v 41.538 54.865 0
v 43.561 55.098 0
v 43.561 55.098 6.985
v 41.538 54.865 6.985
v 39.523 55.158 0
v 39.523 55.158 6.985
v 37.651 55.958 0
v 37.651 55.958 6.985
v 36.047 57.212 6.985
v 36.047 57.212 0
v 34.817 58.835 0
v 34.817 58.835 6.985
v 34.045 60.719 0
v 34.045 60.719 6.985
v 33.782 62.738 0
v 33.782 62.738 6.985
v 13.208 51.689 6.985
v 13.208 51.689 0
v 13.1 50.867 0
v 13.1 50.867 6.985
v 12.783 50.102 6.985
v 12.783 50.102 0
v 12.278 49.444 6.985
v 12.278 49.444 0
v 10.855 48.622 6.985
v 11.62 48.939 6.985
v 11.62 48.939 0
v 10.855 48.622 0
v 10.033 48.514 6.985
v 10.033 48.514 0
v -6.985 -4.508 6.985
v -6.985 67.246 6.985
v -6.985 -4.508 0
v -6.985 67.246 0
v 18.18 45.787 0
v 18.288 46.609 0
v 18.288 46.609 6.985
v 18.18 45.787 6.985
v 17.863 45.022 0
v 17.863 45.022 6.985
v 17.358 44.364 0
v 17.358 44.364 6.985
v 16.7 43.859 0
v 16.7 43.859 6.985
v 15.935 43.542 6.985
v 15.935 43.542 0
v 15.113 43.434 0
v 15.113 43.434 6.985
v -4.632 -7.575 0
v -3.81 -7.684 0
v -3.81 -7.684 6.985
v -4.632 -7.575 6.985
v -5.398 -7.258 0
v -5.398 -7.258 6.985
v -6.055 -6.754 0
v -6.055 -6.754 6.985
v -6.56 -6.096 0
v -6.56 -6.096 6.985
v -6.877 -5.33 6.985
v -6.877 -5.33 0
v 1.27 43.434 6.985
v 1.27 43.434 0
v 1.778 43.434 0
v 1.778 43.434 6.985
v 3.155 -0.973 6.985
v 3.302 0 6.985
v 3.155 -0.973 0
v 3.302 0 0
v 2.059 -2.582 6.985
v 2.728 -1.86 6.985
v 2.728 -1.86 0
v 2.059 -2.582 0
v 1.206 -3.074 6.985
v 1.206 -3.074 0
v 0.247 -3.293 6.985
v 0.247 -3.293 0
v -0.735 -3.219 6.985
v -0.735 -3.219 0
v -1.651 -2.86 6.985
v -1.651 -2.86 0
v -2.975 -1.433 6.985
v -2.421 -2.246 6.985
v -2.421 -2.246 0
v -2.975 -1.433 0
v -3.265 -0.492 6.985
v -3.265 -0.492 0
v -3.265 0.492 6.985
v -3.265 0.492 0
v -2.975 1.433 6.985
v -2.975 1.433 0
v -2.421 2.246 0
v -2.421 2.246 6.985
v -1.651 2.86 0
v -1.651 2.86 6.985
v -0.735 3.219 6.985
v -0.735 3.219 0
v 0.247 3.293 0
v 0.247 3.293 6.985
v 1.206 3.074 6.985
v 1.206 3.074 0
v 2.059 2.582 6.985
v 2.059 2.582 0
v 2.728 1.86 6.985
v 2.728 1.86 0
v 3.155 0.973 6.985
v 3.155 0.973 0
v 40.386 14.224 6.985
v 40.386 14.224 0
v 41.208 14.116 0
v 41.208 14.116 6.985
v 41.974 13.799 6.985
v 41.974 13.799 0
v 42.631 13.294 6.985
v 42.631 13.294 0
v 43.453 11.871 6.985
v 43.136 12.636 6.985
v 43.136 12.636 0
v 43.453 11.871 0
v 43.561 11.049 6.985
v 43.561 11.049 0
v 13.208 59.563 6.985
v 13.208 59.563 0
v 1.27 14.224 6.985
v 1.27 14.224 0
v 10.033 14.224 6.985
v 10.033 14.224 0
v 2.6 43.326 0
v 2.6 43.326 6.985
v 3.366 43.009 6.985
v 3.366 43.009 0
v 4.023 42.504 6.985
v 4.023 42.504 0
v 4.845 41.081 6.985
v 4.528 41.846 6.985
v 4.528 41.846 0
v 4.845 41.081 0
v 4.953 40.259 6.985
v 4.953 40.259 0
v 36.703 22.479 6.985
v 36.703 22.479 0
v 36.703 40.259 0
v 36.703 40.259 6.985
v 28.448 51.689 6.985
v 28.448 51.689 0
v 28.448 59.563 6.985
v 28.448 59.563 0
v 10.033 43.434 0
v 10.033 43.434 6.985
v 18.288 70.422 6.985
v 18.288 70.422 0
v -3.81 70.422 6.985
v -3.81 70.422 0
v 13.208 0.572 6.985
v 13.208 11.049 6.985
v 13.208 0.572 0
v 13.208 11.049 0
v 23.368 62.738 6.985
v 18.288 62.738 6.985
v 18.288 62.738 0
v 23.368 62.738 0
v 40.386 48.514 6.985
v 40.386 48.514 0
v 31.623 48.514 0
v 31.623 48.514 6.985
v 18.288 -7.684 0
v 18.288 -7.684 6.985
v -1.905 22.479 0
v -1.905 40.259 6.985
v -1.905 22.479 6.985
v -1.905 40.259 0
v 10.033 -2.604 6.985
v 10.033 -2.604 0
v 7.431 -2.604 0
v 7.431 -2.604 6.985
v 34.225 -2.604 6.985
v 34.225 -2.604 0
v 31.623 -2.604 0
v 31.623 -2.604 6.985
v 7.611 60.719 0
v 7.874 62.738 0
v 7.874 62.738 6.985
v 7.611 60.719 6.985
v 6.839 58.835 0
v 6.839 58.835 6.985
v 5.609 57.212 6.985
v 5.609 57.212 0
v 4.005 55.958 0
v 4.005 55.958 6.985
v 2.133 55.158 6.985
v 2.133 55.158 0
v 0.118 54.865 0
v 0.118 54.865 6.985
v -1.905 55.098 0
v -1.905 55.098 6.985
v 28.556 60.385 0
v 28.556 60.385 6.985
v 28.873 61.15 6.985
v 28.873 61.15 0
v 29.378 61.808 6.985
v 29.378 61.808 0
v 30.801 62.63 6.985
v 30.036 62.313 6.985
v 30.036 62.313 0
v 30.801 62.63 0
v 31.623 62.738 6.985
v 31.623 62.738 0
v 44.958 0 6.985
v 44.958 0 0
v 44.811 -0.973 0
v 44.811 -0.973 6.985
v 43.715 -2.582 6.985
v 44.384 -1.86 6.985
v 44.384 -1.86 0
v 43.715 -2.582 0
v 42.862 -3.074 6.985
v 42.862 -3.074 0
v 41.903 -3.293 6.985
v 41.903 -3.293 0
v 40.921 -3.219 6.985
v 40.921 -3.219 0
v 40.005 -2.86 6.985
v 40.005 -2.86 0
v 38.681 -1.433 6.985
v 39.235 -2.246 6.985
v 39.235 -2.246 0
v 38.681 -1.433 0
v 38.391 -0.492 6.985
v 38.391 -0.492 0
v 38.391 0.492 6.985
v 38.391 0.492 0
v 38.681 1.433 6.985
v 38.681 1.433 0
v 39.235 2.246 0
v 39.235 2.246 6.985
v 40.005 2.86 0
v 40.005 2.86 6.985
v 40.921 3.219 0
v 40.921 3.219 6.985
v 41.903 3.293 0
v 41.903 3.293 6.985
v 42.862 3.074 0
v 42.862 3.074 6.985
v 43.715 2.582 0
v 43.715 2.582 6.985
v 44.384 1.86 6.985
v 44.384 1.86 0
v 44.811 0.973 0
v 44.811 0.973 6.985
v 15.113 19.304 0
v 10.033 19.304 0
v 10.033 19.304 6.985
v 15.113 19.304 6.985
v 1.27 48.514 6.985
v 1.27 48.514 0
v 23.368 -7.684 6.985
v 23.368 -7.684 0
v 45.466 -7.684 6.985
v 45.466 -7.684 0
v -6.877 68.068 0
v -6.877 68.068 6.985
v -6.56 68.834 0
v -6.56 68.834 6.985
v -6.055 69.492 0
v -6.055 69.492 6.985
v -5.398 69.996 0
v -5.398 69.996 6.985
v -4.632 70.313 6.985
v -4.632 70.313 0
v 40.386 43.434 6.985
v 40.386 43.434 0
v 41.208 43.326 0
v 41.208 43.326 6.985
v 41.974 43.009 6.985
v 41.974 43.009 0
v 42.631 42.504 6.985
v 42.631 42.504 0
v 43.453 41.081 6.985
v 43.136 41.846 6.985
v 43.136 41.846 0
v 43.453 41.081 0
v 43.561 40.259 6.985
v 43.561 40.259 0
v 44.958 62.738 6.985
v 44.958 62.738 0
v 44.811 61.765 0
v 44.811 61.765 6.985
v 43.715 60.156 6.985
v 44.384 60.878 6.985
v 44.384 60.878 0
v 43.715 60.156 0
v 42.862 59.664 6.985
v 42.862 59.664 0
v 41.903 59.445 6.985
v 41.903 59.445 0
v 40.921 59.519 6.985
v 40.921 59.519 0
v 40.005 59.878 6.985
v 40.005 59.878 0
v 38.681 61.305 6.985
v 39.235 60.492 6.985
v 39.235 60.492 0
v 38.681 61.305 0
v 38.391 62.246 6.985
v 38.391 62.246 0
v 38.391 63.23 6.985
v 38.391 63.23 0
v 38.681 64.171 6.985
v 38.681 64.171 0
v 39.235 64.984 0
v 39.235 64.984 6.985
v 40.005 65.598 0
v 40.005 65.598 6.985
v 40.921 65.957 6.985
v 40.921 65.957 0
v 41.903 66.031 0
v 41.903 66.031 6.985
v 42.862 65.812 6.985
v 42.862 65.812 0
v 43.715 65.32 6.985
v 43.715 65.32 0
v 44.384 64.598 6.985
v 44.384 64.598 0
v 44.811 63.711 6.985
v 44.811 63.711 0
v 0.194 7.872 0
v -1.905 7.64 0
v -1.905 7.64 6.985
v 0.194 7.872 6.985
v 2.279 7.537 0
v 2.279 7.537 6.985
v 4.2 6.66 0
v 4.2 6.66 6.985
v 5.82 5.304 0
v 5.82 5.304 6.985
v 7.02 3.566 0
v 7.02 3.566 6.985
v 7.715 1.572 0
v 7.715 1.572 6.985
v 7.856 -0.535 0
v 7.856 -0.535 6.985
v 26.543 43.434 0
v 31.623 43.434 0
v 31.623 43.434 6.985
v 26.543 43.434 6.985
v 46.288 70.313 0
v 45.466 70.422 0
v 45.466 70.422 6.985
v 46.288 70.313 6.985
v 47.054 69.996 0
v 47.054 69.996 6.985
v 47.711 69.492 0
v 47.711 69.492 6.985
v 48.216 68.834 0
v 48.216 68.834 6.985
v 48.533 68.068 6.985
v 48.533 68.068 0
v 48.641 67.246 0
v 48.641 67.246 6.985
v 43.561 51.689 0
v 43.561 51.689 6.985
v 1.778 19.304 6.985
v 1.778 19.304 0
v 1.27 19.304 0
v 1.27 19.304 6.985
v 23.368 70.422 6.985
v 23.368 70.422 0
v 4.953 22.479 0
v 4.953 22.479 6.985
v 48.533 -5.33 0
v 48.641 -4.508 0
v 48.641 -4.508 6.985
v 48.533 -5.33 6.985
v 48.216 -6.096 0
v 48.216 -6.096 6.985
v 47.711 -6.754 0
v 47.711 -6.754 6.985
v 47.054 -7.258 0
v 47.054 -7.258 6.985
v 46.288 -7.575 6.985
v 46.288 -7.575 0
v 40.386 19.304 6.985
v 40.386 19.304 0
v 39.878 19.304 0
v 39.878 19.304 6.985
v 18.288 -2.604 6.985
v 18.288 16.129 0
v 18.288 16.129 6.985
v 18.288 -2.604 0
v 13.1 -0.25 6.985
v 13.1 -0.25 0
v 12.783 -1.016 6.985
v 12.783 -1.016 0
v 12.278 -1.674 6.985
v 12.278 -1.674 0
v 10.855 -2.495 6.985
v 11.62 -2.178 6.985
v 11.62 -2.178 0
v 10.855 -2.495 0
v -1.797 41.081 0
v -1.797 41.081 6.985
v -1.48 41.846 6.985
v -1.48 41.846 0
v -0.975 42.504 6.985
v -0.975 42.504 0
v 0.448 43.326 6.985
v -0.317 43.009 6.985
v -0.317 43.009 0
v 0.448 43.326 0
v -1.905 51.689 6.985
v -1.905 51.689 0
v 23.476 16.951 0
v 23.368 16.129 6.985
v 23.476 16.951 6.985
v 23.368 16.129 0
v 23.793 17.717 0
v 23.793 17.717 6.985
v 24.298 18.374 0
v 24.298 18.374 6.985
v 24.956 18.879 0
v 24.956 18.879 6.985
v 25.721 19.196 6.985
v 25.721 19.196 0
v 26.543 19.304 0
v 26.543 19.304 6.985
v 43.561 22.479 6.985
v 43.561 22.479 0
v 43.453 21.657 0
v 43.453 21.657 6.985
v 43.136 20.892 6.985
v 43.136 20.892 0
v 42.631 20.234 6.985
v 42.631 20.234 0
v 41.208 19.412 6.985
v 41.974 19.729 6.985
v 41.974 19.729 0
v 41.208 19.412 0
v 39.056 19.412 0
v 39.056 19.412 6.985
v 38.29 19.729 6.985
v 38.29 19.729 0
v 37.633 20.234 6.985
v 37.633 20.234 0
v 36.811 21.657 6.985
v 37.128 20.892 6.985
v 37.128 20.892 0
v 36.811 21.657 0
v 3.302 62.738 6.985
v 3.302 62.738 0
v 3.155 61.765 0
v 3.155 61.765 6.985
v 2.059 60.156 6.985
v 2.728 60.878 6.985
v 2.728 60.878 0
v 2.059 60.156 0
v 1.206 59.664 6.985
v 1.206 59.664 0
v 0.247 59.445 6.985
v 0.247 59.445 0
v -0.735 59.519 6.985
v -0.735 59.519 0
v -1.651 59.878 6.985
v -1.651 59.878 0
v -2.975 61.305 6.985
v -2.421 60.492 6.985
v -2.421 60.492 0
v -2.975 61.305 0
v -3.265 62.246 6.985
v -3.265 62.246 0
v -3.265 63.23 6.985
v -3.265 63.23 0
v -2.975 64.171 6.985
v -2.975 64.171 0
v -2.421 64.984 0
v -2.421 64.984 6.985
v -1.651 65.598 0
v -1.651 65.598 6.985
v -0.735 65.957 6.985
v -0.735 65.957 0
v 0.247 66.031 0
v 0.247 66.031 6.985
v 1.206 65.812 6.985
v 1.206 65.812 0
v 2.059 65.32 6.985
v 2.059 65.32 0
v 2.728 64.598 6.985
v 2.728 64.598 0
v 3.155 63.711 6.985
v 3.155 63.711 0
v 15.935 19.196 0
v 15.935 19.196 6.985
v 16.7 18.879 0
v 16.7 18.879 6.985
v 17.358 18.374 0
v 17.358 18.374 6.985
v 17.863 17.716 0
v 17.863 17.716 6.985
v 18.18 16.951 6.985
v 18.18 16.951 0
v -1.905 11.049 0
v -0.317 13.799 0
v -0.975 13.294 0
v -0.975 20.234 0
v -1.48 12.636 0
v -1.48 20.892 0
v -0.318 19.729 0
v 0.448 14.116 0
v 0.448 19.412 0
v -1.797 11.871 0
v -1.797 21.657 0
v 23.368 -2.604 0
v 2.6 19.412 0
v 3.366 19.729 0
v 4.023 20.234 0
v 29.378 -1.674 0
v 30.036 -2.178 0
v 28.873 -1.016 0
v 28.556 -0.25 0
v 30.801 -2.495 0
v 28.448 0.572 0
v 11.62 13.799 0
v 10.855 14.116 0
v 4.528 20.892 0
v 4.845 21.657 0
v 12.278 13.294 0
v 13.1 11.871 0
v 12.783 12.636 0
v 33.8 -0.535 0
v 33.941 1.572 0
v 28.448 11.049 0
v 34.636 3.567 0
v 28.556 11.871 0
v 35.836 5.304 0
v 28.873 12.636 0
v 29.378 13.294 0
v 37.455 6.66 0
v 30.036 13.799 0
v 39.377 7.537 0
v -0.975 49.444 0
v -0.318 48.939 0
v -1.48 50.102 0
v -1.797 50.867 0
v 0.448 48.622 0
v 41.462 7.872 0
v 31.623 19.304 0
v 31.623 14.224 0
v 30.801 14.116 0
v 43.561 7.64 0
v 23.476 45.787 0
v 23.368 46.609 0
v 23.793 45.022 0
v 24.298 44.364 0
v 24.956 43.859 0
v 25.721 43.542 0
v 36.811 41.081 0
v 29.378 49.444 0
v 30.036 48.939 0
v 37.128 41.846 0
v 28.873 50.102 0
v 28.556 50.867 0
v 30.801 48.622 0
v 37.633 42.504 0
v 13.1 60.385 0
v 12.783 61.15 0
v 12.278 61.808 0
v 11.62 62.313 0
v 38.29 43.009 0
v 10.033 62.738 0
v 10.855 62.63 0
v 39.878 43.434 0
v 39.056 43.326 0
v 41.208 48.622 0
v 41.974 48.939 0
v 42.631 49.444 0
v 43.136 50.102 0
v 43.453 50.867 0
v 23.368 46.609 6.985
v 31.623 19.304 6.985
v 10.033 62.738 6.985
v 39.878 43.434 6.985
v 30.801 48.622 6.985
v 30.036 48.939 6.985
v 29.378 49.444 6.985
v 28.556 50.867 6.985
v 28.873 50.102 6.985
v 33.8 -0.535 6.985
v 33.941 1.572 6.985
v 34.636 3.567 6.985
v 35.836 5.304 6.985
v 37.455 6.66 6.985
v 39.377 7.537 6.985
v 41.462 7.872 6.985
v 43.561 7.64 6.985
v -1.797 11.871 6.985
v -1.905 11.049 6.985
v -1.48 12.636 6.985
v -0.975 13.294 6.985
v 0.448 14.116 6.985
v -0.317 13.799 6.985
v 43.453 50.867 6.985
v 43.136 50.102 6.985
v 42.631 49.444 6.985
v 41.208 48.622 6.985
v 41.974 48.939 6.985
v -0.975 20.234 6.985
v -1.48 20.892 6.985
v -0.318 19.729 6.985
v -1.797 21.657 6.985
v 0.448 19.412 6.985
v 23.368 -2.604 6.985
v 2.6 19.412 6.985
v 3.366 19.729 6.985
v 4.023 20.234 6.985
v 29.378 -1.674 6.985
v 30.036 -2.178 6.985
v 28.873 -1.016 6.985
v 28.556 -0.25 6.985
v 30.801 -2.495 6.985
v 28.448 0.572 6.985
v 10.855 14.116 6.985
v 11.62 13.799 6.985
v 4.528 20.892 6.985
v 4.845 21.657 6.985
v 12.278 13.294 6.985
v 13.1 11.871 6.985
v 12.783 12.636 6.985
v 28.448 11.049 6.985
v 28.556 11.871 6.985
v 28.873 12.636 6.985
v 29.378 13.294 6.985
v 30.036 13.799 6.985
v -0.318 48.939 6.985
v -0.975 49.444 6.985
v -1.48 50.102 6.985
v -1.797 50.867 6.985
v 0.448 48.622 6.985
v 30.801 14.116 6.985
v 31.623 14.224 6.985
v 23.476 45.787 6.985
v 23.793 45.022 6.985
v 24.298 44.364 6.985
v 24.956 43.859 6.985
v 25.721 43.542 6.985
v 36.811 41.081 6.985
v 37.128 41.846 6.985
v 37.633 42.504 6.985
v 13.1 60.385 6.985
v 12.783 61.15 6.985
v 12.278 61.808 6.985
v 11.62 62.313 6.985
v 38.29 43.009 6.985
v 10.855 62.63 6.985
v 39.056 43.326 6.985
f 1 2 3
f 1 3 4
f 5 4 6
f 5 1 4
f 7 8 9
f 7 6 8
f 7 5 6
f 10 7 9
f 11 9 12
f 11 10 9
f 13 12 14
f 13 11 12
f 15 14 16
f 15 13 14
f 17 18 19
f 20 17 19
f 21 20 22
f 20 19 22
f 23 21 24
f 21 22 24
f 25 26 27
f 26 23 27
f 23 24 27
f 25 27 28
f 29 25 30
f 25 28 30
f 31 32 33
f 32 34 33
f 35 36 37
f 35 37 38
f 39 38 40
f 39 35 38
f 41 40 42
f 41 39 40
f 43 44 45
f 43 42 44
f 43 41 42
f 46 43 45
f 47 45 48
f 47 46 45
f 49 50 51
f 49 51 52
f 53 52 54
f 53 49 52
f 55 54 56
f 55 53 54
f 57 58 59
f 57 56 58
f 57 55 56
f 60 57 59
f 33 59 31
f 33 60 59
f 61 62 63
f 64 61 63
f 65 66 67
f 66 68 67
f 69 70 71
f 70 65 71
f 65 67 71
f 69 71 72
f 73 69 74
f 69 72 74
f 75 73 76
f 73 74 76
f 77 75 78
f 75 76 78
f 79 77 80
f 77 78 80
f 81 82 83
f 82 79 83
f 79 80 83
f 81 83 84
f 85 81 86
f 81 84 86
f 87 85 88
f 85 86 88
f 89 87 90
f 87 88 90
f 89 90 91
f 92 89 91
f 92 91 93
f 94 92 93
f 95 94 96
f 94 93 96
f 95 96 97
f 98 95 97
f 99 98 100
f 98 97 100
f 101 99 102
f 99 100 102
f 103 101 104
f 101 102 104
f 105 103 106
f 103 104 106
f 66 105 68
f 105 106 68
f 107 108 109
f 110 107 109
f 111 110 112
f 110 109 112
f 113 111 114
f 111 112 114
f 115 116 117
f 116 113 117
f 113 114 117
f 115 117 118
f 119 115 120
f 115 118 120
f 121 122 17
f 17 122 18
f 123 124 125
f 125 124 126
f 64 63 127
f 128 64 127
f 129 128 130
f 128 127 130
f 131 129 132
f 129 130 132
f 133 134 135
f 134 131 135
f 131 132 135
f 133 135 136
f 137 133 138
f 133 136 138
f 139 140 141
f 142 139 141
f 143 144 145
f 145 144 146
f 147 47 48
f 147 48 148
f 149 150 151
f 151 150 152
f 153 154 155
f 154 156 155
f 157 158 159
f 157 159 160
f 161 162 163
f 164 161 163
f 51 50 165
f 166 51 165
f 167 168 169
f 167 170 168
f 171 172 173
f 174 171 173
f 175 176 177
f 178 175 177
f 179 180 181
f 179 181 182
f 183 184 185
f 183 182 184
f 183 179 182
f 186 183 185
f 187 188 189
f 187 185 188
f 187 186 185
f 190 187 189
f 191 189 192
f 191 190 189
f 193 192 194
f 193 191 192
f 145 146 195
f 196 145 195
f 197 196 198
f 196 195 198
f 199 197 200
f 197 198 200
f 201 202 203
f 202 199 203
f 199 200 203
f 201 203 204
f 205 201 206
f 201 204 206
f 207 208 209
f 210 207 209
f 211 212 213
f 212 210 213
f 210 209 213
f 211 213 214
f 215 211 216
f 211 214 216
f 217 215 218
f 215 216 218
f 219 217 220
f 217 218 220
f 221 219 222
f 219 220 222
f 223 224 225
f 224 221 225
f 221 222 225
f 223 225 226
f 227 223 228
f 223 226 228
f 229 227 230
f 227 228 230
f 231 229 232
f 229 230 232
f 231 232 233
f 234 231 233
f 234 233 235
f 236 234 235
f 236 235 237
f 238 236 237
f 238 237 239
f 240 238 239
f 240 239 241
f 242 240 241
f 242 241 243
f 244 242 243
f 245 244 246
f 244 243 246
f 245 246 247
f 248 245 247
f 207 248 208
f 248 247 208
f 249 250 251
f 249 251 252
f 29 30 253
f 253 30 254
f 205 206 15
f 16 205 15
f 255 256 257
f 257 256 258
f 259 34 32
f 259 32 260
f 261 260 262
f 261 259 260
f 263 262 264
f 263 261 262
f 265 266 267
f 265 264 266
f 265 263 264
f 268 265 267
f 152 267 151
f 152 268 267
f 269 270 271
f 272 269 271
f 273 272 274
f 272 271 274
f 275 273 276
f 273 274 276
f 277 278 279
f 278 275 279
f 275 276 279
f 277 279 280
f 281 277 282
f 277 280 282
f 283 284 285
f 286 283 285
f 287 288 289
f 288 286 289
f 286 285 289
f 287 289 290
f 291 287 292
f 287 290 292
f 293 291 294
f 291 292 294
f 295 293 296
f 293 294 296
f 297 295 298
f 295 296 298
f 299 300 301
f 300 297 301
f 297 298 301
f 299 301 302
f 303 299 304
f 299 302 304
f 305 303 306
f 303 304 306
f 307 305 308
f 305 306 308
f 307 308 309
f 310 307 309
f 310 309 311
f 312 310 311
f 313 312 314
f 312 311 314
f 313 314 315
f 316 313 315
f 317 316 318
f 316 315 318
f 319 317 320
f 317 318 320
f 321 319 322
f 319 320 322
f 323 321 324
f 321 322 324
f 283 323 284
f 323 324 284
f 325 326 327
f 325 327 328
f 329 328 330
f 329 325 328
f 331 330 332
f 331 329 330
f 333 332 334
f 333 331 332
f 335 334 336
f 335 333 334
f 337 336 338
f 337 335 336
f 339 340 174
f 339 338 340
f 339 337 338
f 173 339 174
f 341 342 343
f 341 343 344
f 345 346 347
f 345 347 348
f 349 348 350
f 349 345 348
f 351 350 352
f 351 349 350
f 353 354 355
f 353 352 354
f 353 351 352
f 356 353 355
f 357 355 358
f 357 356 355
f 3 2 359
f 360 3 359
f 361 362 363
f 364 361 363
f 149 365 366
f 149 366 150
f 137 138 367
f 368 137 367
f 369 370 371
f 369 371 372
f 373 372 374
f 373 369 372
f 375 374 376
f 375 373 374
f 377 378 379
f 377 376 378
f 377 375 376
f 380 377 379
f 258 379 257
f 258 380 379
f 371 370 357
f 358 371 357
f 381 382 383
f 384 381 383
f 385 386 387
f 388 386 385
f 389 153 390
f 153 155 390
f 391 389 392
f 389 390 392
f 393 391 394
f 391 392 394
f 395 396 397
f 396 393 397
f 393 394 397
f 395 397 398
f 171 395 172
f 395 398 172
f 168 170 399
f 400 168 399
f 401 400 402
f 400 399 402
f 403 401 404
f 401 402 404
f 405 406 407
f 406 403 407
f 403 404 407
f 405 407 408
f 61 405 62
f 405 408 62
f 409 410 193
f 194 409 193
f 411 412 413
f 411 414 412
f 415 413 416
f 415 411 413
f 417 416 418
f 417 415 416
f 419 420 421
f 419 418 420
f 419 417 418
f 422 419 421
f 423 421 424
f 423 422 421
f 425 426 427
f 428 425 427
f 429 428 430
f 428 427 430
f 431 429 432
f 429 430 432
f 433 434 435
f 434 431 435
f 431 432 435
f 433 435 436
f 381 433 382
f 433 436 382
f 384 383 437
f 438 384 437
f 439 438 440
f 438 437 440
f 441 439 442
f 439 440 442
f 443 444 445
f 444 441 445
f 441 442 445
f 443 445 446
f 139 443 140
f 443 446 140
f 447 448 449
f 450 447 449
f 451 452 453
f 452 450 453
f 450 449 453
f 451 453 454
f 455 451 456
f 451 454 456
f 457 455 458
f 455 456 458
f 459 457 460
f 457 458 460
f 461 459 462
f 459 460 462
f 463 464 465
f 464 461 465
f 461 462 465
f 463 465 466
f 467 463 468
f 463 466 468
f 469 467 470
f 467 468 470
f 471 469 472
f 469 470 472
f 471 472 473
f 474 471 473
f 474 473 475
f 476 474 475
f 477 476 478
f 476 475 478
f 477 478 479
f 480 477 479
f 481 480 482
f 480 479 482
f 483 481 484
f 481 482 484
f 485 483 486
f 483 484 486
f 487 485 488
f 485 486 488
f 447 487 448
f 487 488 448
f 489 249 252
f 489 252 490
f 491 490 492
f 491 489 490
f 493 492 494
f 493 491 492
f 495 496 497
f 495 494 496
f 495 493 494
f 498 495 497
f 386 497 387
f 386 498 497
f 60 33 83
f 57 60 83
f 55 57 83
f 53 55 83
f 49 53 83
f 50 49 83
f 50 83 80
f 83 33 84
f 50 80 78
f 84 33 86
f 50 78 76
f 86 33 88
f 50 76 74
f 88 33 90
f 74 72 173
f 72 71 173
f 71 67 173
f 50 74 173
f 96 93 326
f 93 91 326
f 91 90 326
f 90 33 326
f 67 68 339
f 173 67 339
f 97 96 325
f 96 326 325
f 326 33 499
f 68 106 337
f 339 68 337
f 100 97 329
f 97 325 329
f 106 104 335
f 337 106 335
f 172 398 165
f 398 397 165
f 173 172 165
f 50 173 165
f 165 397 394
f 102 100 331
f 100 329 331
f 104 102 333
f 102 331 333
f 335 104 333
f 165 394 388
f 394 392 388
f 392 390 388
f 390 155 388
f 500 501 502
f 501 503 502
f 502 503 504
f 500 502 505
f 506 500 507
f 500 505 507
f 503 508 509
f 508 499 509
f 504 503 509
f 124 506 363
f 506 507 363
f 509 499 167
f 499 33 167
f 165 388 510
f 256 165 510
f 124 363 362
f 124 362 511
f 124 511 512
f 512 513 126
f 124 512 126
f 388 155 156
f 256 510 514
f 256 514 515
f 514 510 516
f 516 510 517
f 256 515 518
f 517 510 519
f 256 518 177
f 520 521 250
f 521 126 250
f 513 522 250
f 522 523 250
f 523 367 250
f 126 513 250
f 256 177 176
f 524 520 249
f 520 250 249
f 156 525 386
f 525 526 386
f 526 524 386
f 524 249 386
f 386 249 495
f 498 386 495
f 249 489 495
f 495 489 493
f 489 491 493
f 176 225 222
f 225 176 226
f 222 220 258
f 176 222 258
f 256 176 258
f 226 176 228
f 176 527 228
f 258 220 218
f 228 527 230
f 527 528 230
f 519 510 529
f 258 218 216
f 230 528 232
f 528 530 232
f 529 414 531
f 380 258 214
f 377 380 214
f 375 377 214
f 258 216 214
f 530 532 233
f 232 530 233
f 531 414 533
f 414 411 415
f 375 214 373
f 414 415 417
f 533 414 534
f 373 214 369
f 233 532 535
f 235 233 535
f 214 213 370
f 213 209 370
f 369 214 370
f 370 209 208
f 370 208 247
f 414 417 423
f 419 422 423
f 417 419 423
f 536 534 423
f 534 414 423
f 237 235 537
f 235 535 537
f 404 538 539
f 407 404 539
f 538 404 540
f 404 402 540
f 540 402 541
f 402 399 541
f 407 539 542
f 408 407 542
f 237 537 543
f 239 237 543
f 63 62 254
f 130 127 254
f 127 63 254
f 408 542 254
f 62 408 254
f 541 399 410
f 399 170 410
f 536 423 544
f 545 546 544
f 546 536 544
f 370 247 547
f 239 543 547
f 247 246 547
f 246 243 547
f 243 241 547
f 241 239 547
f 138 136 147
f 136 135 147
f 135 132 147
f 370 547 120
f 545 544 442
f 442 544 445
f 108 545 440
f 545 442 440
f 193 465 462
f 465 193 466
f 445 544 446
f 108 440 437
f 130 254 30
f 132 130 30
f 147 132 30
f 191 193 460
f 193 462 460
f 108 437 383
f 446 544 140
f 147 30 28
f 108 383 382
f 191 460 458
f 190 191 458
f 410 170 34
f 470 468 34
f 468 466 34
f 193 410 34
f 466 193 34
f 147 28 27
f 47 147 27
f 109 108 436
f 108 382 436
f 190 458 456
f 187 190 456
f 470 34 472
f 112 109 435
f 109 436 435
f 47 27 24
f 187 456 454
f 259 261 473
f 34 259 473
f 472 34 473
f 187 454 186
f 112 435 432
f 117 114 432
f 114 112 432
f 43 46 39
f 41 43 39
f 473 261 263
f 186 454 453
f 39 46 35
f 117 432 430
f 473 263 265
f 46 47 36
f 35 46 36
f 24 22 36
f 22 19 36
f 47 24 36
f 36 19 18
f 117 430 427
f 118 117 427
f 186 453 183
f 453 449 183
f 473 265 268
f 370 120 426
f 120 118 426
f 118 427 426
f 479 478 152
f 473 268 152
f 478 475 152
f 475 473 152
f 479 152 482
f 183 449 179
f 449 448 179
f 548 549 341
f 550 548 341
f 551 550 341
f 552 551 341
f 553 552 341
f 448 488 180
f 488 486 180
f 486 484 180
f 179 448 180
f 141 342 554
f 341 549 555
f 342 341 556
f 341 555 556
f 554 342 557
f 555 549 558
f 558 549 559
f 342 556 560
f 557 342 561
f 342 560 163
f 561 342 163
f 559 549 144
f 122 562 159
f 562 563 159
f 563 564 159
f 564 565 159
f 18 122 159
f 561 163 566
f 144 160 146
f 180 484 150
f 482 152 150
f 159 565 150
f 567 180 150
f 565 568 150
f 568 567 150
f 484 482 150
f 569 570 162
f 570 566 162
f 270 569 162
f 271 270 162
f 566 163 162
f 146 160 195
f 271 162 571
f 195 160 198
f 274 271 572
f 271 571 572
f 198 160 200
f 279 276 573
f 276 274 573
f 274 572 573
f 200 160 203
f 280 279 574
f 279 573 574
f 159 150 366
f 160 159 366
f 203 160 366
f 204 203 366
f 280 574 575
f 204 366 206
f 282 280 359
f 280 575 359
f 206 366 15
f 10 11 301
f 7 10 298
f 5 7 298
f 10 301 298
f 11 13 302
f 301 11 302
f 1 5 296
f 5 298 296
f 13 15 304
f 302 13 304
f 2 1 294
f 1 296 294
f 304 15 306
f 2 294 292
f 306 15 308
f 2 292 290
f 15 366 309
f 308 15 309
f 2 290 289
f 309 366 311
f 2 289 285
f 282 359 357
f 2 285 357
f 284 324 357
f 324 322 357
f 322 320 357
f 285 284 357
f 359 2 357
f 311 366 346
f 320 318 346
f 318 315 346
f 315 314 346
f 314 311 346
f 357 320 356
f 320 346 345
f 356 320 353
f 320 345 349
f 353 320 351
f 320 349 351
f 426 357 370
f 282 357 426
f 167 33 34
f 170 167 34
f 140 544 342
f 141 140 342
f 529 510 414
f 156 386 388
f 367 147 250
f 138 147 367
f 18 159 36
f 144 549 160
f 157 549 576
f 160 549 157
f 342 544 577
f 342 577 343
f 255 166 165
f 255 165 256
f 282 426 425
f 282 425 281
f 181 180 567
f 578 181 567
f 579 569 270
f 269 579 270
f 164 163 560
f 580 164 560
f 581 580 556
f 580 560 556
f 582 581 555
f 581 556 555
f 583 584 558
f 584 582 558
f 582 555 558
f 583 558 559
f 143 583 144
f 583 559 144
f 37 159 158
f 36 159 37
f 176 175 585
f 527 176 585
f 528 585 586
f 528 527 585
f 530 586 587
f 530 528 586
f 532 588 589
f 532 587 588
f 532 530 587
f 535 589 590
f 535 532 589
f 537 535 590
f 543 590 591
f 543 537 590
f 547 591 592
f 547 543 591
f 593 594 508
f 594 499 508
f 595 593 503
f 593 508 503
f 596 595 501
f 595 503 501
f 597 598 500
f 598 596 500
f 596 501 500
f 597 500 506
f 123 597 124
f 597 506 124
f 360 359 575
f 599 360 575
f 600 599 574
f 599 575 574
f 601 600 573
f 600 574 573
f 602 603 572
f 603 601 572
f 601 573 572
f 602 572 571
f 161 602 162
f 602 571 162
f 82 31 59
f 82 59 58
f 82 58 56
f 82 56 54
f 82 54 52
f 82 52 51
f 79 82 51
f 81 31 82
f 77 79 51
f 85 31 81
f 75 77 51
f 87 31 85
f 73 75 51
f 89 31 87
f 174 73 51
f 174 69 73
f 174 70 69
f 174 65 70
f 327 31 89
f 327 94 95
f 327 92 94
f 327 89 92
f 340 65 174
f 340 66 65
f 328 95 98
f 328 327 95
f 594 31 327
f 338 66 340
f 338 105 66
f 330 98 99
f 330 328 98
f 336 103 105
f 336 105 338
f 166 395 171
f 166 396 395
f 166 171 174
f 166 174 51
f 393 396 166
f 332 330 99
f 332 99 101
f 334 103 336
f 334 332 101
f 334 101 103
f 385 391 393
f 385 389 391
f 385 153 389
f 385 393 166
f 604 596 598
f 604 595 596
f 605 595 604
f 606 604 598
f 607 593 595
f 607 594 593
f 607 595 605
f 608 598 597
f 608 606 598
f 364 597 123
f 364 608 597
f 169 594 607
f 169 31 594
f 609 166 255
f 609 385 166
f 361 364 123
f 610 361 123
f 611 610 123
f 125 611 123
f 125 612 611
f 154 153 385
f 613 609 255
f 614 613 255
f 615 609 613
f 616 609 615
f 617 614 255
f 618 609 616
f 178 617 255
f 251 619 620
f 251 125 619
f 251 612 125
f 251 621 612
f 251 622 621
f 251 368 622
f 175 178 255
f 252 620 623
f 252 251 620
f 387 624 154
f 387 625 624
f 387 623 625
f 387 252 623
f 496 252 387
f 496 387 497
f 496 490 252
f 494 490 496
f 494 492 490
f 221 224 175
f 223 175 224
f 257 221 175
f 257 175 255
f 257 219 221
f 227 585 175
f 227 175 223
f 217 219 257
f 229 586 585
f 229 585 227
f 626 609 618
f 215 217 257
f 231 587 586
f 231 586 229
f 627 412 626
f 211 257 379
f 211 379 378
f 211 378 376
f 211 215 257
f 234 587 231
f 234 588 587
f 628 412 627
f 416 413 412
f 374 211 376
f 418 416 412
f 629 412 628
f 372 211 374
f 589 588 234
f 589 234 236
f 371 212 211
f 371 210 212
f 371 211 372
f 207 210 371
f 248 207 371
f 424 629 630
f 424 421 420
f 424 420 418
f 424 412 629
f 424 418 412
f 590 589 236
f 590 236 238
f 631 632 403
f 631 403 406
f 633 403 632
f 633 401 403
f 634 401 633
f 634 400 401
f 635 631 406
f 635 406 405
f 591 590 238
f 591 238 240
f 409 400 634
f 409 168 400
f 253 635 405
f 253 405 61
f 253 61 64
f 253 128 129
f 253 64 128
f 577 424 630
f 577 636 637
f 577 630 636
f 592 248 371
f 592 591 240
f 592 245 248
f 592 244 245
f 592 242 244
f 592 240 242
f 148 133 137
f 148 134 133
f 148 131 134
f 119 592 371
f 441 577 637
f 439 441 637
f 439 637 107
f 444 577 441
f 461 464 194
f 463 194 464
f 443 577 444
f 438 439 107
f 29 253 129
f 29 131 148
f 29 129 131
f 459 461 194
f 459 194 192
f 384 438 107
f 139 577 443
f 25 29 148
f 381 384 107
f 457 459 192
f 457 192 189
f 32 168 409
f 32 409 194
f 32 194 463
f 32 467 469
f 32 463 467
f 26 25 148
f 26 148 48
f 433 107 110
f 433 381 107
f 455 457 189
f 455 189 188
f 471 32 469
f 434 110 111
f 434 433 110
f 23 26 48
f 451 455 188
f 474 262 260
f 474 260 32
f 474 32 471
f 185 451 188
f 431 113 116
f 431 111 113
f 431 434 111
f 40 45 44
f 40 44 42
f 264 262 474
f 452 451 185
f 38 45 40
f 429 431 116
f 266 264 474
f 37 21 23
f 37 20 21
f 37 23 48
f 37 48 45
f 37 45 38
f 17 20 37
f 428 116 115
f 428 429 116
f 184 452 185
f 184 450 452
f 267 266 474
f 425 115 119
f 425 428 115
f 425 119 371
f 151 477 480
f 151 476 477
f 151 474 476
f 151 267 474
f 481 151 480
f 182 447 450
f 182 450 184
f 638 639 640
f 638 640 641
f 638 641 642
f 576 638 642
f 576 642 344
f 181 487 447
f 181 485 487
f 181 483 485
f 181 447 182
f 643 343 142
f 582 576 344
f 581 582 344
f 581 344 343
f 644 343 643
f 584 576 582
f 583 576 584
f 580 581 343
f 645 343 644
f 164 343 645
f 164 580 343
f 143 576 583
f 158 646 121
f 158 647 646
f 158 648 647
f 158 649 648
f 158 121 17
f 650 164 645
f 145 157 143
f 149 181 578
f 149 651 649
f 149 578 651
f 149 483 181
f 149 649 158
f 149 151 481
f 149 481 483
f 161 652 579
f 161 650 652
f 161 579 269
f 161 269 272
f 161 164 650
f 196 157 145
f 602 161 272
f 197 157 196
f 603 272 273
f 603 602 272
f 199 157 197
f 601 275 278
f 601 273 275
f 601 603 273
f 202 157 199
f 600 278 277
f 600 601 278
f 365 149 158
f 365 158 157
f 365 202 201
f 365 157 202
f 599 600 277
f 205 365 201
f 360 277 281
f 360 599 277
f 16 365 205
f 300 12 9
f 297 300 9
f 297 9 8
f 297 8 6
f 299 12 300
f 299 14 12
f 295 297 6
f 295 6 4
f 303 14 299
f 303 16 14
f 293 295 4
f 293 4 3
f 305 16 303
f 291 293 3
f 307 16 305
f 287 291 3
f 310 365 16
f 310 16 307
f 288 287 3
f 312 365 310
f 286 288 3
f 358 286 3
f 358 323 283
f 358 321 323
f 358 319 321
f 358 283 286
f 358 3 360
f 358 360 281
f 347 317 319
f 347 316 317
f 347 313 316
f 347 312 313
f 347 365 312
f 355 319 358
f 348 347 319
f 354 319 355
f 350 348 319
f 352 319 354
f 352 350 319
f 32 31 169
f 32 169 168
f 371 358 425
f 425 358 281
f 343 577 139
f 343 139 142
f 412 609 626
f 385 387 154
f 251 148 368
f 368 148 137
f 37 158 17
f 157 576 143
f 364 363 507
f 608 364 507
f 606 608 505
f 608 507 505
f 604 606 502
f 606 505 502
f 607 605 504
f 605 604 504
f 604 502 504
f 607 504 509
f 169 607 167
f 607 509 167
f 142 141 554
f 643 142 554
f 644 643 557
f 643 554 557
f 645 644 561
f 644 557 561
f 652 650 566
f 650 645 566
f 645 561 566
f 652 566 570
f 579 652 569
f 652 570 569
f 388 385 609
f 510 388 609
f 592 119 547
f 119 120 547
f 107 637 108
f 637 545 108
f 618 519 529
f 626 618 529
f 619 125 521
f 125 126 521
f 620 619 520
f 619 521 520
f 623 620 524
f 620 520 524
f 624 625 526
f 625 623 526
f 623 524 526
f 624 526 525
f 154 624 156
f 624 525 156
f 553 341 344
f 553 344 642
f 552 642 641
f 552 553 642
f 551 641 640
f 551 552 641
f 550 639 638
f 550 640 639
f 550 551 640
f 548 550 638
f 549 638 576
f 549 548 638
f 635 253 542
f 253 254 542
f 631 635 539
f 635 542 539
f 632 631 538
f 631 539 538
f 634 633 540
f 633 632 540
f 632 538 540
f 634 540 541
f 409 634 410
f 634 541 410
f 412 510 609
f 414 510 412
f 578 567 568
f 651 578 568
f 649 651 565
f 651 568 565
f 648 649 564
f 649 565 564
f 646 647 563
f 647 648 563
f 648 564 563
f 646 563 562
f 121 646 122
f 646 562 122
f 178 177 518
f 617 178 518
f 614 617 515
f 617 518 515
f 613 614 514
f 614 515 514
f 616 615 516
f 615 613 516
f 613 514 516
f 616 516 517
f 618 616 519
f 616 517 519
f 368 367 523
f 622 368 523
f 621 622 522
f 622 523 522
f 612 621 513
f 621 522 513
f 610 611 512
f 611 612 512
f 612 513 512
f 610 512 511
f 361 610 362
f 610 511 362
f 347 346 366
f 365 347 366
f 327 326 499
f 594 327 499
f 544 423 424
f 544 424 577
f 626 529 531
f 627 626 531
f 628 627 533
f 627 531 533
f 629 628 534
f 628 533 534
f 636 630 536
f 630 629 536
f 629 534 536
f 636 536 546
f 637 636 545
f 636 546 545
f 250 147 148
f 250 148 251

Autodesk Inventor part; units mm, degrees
ref_plane "YZ Plane" through (0, 0, 0) normal (1, 0, 0) x (0, 1, 0)
ref_plane "XZ Plane" through (0, 0, 0) normal (0, 1, 0) x (-1, 0, 0)
ref_plane "XY Plane" through (0, 0, 0) normal (0, 0, 1) x (1, 0, 0)
sketch "Sketch1" plane through (0, 0, 0) normal (0, 0, 1) x (1, 0, 0)
  line L0 (-3.81, -7.6835) -> (45.466, -7.6835)
  line L1 (48.641, -4.5085) -> (48.641, 67.2465)
  line L2 (45.466, 70.4215) -> (-3.81, 70.4215)
  line L3 (-6.985, 67.2465) -> (-6.985, -4.5085)
  arc A0 (45.466, -7.6835) -> (48.641, -4.5085) centre (45.466, -4.5085) ccw
  arc A1 (-6.985, -4.5085) -> (-3.81, -7.6835) centre (-3.81, -4.5085) ccw
  line L4 (31.623, 19.304) -> (31.623, 43.434)
  line L5 (10.033, 43.434) -> (10.033, 19.304)
  line L6 (18.288, -7.6835) -> (23.368, -7.6835)
  line L7 (23.368, 70.4215) -> (18.288, 70.4215)
  arc A2 (-1.905, 55.0979) -> (7.874, 62.738) centre (0, 62.738) ccw
  arc A3 (33.782, 62.738) -> (43.561, 55.0979) centre (41.656, 62.738) ccw
  arc A4 (43.561, 7.6401) -> (34.2249, -2.6035) centre (41.656, 0) ccw
  arc A5 (7.4311, -2.6035) -> (-1.905, 7.6401) centre (0, 0) ccw
  line L8 (34.2249, -2.6035) -> (31.623, -2.6035)
  line L9 (10.033, -2.6035) -> (7.4311, -2.6035)
  line L10 (31.623, 43.434) -> (26.543, 43.434)
  line L11 (15.113, 43.434) -> (10.033, 43.434)
  line L12 (10.033, 19.304) -> (15.113, 19.304)
  line L13 (26.543, 19.304) -> (31.623, 19.304)
  line L14 (23.368, 46.609) -> (23.368, 62.738)
  line L15 (18.288, 62.738) -> (18.288, 46.609)
  line L16 (23.368, -2.6035) -> (23.368, 16.129)
  line L17 (18.288, 16.129) -> (18.288, -2.6035)
  line L18 (18.288, -2.6035) -> (23.368, -2.6035)
  line L19 (28.448, 51.689) -> (28.448, 59.563)
  line L20 (40.386, 48.514) -> (31.623, 48.514)
  line L21 (13.208, 59.563) -> (13.208, 51.689)
  line L22 (10.033, 48.514) -> (1.27, 48.514)
  line L23 (13.208, 11.049) -> (13.208, 0.5715)
  line L24 (1.27, 14.224) -> (10.033, 14.224)
  line L25 (31.623, 14.224) -> (40.386, 14.224)
  line L26 (28.448, 0.5715) -> (28.448, 11.049)
  line L27 (-1.905, 7.6401) -> (-1.905, 11.049)
  line L28 (-1.905, 51.689) -> (-1.905, 55.0979)
  line L29 (43.561, 55.0979) -> (43.561, 51.689)
  line L30 (43.561, 11.049) -> (43.561, 7.6401)
  line L31 (43.561, 22.479) -> (43.561, 40.259)
  line L32 (-1.905, 40.259) -> (-1.905, 22.479)
  line L33 (4.953, 40.259) -> (4.953, 22.479)
  line L34 (36.703, 22.479) -> (36.703, 40.259)
  line L35 (1.27, 43.434) -> (1.778, 43.434)
  line L36 (1.778, 19.304) -> (1.27, 19.304)
  line L37 (39.878, 43.434) -> (40.386, 43.434)
  line L38 (40.386, 19.304) -> (39.878, 19.304)
  arc A6 (10.033, 48.514) -> (13.208, 51.689) centre (10.033, 51.689) ccw
  arc A7 (28.448, 51.689) -> (31.623, 48.514) centre (31.623, 51.689) ccw
  arc A8 (31.623, 14.224) -> (28.448, 11.049) centre (31.623, 11.049) ccw
  arc A9 (13.208, 11.049) -> (10.033, 14.224) centre (10.033, 11.049) ccw
  arc A10 (1.27, 14.224) -> (-1.905, 11.049) centre (1.27, 11.049) ccw
  arc A11 (10.033, -2.6035) -> (13.208, 0.5715) centre (10.033, 0.5715) ccw
  arc A12 (28.448, 0.5715) -> (31.623, -2.6035) centre (31.623, 0.5715) ccw
  arc A13 (43.561, 11.049) -> (40.386, 14.224) centre (40.386, 11.049) ccw
  arc A14 (40.386, 48.514) -> (43.561, 51.689) centre (40.386, 51.689) ccw
  arc A15 (-1.905, 51.689) -> (1.27, 48.514) centre (1.27, 51.689) ccw
  arc A16 (23.368, 46.609) -> (26.543, 43.434) centre (26.543, 46.609) ccw
  arc A17 (15.113, 43.434) -> (18.288, 46.609) centre (15.113, 46.609) ccw
  arc A18 (18.288, 16.129) -> (15.113, 19.304) centre (15.113, 16.129) ccw
  arc A19 (26.543, 19.304) -> (23.368, 16.129) centre (26.543, 16.129) ccw
  arc A20 (36.703, 22.479) -> (39.878, 19.304) centre (39.878, 22.479) ccw
  arc A21 (40.386, 19.304) -> (43.561, 22.479) centre (40.386, 22.479) ccw
  arc A22 (43.561, 40.259) -> (40.386, 43.434) centre (40.386, 40.259) ccw
  arc A23 (39.878, 43.434) -> (36.703, 40.259) centre (39.878, 40.259) ccw
  arc A24 (1.27, 43.434) -> (-1.905, 40.259) centre (1.27, 40.259) ccw
  arc A25 (4.953, 40.259) -> (1.778, 43.434) centre (1.778, 40.259) ccw
  arc A26 (1.778, 19.304) -> (4.953, 22.479) centre (1.778, 22.479) ccw
  arc A27 (-1.905, 22.479) -> (1.27, 19.304) centre (1.27, 22.479) ccw
  line L39 (7.874, 62.738) -> (10.033, 62.738)
  line L40 (18.288, 62.738) -> (23.368, 62.738)
  line L41 (31.623, 62.738) -> (33.782, 62.738)
  arc A28 (13.208, 59.563) -> (10.033, 62.738) centre (10.033, 59.563) ccw
  arc A29 (31.623, 62.738) -> (28.448, 59.563) centre (31.623, 59.563) ccw
  circle A30 centre (0, 62.738) radius 3.302
  circle A31 centre (41.656, 62.738) radius 3.302
  circle A32 centre (0, 0) radius 3.302
  circle A33 centre (41.656, 0) radius 3.302
  arc A34 (-3.81, 70.4215) -> (-6.985, 67.2465) centre (-3.81, 67.2465) ccw
  arc A35 (48.641, 67.2465) -> (45.466, 70.4215) centre (45.466, 67.2465) ccw
  point P0 (20.828, 31.369)
  point P1 (-6.985, 70.4215)
  point P2 (48.641, 70.4215)
  point P3 (23.368, 43.434)
  point P4 (18.288, 43.434)
  point P5 (18.288, 19.304)
  point P6 (23.368, 19.304)
  point P7 (-1.905, 14.224)
  point P8 (43.561, 48.514)
  point P9 (43.561, 14.224)
  point P10 (-1.905, 48.514)
  point P11 (13.208, 65.3415)
  point P12 (28.448, 65.3415)
  point P13 (13.208, -2.6035)
  point P14 (28.448, -2.6035)
  point P15 (28.448, 48.514)
  point P16 (13.208, 48.514)
  point P17 (13.208, 14.224)
  point P18 (28.448, 14.224)
  point P19 (-1.905, 19.304)
  point P20 (43.561, 43.434)
  point P21 (43.561, 19.304)
  point P22 (-1.905, 43.434)
  point P23 (4.953, 43.434)
  point P24 (4.953, 19.304)
  point P25 (36.703, 19.304)
  point P26 (36.703, 43.434)
  point P27 (28.448, 62.738)
  point P28 (13.208, 62.738)
  dimension "d32" = 3.175
  dimension "d37" = 6.604
  dimension "d38" = 6.604
  dimension "d39" = 6.604
  dimension "d40" = 6.604
  dimension "d76" = 3.175
extrude "Extrusion1" add sketch "Sketch1" along normal blind 6.985
properties part number "LED Riser"
